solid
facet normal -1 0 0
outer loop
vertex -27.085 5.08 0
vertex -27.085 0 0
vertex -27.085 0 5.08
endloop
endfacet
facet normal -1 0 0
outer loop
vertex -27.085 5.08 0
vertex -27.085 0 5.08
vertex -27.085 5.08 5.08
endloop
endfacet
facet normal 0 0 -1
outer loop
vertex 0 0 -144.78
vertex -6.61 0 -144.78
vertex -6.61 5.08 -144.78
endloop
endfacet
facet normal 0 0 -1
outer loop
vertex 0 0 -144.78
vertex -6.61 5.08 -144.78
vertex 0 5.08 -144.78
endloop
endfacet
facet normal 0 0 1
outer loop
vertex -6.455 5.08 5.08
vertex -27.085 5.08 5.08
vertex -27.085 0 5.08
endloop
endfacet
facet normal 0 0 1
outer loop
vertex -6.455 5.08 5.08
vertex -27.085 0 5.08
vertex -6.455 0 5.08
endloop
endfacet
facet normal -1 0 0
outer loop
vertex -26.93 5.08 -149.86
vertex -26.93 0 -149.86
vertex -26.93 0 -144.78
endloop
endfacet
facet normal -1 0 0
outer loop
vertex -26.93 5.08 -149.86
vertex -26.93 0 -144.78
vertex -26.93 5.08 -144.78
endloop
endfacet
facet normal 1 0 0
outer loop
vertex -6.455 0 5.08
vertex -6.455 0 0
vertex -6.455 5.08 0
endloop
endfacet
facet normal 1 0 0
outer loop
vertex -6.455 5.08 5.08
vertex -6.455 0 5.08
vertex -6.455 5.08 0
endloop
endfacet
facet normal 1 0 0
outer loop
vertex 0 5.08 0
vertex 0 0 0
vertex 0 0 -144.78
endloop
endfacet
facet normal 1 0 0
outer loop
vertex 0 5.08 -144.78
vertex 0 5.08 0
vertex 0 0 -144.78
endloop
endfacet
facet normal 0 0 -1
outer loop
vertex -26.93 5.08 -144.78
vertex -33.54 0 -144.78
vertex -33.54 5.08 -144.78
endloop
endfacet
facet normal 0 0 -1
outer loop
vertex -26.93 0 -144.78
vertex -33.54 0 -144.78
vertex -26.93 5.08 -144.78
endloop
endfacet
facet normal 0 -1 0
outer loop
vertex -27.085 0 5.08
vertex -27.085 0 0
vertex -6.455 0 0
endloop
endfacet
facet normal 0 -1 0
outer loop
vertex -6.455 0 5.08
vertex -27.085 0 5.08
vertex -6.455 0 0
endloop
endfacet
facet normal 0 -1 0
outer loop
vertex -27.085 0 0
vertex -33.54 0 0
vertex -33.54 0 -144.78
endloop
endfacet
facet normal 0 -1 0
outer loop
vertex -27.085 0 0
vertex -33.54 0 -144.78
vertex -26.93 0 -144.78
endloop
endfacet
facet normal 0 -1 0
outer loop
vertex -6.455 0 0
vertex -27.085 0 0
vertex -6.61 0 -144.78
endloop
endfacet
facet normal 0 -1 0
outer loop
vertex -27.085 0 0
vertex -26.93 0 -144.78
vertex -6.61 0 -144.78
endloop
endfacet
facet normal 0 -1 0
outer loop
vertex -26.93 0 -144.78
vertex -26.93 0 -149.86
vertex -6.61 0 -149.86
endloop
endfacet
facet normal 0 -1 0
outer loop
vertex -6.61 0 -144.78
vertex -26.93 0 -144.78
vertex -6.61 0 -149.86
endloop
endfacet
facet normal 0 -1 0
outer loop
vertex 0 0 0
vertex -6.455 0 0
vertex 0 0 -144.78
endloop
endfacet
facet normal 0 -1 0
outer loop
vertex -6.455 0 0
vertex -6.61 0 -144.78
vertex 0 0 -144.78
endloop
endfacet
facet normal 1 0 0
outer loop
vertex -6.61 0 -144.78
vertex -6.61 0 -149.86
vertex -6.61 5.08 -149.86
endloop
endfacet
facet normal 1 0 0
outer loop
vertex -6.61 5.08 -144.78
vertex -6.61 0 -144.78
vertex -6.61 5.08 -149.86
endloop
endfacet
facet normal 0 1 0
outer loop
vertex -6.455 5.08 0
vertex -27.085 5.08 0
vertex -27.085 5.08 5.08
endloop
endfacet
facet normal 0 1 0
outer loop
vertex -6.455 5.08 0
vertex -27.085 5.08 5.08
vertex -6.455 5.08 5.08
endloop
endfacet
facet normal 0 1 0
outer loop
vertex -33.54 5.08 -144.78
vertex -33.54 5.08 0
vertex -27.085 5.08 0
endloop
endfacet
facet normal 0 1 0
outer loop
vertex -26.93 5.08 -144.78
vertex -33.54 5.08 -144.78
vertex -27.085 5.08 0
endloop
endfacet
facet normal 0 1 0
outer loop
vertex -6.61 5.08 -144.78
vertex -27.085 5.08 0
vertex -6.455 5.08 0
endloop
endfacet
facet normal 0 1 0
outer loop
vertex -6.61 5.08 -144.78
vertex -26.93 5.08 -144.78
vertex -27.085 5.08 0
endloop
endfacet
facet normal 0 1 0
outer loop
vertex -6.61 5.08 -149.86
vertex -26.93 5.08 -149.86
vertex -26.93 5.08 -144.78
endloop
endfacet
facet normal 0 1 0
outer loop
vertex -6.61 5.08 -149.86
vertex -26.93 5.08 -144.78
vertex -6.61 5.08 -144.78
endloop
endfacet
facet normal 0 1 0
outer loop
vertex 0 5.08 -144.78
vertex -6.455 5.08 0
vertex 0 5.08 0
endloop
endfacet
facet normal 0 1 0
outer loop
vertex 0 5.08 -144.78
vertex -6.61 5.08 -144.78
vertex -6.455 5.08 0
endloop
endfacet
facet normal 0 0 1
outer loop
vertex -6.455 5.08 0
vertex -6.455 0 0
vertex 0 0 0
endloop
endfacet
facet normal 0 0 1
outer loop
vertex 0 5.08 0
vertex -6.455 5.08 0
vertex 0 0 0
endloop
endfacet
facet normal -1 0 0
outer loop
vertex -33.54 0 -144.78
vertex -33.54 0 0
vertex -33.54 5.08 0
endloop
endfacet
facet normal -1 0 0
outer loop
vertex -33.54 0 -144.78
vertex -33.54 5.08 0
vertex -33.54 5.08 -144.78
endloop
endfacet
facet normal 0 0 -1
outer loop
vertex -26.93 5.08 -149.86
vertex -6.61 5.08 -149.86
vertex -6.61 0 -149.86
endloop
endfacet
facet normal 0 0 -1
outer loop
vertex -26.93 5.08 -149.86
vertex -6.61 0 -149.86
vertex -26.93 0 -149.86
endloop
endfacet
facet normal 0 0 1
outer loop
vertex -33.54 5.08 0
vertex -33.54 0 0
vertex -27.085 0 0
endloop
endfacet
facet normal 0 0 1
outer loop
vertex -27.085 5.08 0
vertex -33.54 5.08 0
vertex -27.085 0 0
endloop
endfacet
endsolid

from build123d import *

# Parameters (mm, degrees)
SKETCH1_W           = 33.54
SKETCH1_H           = 144.78
BOSS_EXTRUDE1_DEPTH = 5.08
SKETCH2_W           = 20.32
SKETCH2_H           = 5.08
BOSS_EXTRUDE2_DEPTH = 5.08
SKETCH3_W           = 20.63
SKETCH3_H           = 5.08
BOSS_EXTRUDE3_DEPTH = 5.08


with BuildPart() as part:
    # Sketch1 → Boss-Extrude1 (new body)
    with BuildSketch(Plane(origin=(0, 0, 0), x_dir=(1, 0, 0), z_dir=(0, 1, 0))):
        with Locations((-16.77, 72.39)):
            Rectangle(SKETCH1_W, SKETCH1_H)
    extrude(amount=BOSS_EXTRUDE1_DEPTH)

    # Sketch2 → Boss-Extrude2 (add)
    with BuildSketch(Plane(origin=(0, 0, -144.78), x_dir=(-1, 0, 0), z_dir=(0, 0, -1))):
        with Locations((16.77, 2.54)):
            Rectangle(SKETCH2_W, SKETCH2_H)
    extrude(amount=BOSS_EXTRUDE2_DEPTH)

    # Sketch3 → Boss-Extrude3 (add)
    with BuildSketch(Plane.XY):
        with Locations((-16.77, 2.54)):
            Rectangle(SKETCH3_W, SKETCH3_H)
    extrude(amount=BOSS_EXTRUDE3_DEPTH)


solid = part.part
